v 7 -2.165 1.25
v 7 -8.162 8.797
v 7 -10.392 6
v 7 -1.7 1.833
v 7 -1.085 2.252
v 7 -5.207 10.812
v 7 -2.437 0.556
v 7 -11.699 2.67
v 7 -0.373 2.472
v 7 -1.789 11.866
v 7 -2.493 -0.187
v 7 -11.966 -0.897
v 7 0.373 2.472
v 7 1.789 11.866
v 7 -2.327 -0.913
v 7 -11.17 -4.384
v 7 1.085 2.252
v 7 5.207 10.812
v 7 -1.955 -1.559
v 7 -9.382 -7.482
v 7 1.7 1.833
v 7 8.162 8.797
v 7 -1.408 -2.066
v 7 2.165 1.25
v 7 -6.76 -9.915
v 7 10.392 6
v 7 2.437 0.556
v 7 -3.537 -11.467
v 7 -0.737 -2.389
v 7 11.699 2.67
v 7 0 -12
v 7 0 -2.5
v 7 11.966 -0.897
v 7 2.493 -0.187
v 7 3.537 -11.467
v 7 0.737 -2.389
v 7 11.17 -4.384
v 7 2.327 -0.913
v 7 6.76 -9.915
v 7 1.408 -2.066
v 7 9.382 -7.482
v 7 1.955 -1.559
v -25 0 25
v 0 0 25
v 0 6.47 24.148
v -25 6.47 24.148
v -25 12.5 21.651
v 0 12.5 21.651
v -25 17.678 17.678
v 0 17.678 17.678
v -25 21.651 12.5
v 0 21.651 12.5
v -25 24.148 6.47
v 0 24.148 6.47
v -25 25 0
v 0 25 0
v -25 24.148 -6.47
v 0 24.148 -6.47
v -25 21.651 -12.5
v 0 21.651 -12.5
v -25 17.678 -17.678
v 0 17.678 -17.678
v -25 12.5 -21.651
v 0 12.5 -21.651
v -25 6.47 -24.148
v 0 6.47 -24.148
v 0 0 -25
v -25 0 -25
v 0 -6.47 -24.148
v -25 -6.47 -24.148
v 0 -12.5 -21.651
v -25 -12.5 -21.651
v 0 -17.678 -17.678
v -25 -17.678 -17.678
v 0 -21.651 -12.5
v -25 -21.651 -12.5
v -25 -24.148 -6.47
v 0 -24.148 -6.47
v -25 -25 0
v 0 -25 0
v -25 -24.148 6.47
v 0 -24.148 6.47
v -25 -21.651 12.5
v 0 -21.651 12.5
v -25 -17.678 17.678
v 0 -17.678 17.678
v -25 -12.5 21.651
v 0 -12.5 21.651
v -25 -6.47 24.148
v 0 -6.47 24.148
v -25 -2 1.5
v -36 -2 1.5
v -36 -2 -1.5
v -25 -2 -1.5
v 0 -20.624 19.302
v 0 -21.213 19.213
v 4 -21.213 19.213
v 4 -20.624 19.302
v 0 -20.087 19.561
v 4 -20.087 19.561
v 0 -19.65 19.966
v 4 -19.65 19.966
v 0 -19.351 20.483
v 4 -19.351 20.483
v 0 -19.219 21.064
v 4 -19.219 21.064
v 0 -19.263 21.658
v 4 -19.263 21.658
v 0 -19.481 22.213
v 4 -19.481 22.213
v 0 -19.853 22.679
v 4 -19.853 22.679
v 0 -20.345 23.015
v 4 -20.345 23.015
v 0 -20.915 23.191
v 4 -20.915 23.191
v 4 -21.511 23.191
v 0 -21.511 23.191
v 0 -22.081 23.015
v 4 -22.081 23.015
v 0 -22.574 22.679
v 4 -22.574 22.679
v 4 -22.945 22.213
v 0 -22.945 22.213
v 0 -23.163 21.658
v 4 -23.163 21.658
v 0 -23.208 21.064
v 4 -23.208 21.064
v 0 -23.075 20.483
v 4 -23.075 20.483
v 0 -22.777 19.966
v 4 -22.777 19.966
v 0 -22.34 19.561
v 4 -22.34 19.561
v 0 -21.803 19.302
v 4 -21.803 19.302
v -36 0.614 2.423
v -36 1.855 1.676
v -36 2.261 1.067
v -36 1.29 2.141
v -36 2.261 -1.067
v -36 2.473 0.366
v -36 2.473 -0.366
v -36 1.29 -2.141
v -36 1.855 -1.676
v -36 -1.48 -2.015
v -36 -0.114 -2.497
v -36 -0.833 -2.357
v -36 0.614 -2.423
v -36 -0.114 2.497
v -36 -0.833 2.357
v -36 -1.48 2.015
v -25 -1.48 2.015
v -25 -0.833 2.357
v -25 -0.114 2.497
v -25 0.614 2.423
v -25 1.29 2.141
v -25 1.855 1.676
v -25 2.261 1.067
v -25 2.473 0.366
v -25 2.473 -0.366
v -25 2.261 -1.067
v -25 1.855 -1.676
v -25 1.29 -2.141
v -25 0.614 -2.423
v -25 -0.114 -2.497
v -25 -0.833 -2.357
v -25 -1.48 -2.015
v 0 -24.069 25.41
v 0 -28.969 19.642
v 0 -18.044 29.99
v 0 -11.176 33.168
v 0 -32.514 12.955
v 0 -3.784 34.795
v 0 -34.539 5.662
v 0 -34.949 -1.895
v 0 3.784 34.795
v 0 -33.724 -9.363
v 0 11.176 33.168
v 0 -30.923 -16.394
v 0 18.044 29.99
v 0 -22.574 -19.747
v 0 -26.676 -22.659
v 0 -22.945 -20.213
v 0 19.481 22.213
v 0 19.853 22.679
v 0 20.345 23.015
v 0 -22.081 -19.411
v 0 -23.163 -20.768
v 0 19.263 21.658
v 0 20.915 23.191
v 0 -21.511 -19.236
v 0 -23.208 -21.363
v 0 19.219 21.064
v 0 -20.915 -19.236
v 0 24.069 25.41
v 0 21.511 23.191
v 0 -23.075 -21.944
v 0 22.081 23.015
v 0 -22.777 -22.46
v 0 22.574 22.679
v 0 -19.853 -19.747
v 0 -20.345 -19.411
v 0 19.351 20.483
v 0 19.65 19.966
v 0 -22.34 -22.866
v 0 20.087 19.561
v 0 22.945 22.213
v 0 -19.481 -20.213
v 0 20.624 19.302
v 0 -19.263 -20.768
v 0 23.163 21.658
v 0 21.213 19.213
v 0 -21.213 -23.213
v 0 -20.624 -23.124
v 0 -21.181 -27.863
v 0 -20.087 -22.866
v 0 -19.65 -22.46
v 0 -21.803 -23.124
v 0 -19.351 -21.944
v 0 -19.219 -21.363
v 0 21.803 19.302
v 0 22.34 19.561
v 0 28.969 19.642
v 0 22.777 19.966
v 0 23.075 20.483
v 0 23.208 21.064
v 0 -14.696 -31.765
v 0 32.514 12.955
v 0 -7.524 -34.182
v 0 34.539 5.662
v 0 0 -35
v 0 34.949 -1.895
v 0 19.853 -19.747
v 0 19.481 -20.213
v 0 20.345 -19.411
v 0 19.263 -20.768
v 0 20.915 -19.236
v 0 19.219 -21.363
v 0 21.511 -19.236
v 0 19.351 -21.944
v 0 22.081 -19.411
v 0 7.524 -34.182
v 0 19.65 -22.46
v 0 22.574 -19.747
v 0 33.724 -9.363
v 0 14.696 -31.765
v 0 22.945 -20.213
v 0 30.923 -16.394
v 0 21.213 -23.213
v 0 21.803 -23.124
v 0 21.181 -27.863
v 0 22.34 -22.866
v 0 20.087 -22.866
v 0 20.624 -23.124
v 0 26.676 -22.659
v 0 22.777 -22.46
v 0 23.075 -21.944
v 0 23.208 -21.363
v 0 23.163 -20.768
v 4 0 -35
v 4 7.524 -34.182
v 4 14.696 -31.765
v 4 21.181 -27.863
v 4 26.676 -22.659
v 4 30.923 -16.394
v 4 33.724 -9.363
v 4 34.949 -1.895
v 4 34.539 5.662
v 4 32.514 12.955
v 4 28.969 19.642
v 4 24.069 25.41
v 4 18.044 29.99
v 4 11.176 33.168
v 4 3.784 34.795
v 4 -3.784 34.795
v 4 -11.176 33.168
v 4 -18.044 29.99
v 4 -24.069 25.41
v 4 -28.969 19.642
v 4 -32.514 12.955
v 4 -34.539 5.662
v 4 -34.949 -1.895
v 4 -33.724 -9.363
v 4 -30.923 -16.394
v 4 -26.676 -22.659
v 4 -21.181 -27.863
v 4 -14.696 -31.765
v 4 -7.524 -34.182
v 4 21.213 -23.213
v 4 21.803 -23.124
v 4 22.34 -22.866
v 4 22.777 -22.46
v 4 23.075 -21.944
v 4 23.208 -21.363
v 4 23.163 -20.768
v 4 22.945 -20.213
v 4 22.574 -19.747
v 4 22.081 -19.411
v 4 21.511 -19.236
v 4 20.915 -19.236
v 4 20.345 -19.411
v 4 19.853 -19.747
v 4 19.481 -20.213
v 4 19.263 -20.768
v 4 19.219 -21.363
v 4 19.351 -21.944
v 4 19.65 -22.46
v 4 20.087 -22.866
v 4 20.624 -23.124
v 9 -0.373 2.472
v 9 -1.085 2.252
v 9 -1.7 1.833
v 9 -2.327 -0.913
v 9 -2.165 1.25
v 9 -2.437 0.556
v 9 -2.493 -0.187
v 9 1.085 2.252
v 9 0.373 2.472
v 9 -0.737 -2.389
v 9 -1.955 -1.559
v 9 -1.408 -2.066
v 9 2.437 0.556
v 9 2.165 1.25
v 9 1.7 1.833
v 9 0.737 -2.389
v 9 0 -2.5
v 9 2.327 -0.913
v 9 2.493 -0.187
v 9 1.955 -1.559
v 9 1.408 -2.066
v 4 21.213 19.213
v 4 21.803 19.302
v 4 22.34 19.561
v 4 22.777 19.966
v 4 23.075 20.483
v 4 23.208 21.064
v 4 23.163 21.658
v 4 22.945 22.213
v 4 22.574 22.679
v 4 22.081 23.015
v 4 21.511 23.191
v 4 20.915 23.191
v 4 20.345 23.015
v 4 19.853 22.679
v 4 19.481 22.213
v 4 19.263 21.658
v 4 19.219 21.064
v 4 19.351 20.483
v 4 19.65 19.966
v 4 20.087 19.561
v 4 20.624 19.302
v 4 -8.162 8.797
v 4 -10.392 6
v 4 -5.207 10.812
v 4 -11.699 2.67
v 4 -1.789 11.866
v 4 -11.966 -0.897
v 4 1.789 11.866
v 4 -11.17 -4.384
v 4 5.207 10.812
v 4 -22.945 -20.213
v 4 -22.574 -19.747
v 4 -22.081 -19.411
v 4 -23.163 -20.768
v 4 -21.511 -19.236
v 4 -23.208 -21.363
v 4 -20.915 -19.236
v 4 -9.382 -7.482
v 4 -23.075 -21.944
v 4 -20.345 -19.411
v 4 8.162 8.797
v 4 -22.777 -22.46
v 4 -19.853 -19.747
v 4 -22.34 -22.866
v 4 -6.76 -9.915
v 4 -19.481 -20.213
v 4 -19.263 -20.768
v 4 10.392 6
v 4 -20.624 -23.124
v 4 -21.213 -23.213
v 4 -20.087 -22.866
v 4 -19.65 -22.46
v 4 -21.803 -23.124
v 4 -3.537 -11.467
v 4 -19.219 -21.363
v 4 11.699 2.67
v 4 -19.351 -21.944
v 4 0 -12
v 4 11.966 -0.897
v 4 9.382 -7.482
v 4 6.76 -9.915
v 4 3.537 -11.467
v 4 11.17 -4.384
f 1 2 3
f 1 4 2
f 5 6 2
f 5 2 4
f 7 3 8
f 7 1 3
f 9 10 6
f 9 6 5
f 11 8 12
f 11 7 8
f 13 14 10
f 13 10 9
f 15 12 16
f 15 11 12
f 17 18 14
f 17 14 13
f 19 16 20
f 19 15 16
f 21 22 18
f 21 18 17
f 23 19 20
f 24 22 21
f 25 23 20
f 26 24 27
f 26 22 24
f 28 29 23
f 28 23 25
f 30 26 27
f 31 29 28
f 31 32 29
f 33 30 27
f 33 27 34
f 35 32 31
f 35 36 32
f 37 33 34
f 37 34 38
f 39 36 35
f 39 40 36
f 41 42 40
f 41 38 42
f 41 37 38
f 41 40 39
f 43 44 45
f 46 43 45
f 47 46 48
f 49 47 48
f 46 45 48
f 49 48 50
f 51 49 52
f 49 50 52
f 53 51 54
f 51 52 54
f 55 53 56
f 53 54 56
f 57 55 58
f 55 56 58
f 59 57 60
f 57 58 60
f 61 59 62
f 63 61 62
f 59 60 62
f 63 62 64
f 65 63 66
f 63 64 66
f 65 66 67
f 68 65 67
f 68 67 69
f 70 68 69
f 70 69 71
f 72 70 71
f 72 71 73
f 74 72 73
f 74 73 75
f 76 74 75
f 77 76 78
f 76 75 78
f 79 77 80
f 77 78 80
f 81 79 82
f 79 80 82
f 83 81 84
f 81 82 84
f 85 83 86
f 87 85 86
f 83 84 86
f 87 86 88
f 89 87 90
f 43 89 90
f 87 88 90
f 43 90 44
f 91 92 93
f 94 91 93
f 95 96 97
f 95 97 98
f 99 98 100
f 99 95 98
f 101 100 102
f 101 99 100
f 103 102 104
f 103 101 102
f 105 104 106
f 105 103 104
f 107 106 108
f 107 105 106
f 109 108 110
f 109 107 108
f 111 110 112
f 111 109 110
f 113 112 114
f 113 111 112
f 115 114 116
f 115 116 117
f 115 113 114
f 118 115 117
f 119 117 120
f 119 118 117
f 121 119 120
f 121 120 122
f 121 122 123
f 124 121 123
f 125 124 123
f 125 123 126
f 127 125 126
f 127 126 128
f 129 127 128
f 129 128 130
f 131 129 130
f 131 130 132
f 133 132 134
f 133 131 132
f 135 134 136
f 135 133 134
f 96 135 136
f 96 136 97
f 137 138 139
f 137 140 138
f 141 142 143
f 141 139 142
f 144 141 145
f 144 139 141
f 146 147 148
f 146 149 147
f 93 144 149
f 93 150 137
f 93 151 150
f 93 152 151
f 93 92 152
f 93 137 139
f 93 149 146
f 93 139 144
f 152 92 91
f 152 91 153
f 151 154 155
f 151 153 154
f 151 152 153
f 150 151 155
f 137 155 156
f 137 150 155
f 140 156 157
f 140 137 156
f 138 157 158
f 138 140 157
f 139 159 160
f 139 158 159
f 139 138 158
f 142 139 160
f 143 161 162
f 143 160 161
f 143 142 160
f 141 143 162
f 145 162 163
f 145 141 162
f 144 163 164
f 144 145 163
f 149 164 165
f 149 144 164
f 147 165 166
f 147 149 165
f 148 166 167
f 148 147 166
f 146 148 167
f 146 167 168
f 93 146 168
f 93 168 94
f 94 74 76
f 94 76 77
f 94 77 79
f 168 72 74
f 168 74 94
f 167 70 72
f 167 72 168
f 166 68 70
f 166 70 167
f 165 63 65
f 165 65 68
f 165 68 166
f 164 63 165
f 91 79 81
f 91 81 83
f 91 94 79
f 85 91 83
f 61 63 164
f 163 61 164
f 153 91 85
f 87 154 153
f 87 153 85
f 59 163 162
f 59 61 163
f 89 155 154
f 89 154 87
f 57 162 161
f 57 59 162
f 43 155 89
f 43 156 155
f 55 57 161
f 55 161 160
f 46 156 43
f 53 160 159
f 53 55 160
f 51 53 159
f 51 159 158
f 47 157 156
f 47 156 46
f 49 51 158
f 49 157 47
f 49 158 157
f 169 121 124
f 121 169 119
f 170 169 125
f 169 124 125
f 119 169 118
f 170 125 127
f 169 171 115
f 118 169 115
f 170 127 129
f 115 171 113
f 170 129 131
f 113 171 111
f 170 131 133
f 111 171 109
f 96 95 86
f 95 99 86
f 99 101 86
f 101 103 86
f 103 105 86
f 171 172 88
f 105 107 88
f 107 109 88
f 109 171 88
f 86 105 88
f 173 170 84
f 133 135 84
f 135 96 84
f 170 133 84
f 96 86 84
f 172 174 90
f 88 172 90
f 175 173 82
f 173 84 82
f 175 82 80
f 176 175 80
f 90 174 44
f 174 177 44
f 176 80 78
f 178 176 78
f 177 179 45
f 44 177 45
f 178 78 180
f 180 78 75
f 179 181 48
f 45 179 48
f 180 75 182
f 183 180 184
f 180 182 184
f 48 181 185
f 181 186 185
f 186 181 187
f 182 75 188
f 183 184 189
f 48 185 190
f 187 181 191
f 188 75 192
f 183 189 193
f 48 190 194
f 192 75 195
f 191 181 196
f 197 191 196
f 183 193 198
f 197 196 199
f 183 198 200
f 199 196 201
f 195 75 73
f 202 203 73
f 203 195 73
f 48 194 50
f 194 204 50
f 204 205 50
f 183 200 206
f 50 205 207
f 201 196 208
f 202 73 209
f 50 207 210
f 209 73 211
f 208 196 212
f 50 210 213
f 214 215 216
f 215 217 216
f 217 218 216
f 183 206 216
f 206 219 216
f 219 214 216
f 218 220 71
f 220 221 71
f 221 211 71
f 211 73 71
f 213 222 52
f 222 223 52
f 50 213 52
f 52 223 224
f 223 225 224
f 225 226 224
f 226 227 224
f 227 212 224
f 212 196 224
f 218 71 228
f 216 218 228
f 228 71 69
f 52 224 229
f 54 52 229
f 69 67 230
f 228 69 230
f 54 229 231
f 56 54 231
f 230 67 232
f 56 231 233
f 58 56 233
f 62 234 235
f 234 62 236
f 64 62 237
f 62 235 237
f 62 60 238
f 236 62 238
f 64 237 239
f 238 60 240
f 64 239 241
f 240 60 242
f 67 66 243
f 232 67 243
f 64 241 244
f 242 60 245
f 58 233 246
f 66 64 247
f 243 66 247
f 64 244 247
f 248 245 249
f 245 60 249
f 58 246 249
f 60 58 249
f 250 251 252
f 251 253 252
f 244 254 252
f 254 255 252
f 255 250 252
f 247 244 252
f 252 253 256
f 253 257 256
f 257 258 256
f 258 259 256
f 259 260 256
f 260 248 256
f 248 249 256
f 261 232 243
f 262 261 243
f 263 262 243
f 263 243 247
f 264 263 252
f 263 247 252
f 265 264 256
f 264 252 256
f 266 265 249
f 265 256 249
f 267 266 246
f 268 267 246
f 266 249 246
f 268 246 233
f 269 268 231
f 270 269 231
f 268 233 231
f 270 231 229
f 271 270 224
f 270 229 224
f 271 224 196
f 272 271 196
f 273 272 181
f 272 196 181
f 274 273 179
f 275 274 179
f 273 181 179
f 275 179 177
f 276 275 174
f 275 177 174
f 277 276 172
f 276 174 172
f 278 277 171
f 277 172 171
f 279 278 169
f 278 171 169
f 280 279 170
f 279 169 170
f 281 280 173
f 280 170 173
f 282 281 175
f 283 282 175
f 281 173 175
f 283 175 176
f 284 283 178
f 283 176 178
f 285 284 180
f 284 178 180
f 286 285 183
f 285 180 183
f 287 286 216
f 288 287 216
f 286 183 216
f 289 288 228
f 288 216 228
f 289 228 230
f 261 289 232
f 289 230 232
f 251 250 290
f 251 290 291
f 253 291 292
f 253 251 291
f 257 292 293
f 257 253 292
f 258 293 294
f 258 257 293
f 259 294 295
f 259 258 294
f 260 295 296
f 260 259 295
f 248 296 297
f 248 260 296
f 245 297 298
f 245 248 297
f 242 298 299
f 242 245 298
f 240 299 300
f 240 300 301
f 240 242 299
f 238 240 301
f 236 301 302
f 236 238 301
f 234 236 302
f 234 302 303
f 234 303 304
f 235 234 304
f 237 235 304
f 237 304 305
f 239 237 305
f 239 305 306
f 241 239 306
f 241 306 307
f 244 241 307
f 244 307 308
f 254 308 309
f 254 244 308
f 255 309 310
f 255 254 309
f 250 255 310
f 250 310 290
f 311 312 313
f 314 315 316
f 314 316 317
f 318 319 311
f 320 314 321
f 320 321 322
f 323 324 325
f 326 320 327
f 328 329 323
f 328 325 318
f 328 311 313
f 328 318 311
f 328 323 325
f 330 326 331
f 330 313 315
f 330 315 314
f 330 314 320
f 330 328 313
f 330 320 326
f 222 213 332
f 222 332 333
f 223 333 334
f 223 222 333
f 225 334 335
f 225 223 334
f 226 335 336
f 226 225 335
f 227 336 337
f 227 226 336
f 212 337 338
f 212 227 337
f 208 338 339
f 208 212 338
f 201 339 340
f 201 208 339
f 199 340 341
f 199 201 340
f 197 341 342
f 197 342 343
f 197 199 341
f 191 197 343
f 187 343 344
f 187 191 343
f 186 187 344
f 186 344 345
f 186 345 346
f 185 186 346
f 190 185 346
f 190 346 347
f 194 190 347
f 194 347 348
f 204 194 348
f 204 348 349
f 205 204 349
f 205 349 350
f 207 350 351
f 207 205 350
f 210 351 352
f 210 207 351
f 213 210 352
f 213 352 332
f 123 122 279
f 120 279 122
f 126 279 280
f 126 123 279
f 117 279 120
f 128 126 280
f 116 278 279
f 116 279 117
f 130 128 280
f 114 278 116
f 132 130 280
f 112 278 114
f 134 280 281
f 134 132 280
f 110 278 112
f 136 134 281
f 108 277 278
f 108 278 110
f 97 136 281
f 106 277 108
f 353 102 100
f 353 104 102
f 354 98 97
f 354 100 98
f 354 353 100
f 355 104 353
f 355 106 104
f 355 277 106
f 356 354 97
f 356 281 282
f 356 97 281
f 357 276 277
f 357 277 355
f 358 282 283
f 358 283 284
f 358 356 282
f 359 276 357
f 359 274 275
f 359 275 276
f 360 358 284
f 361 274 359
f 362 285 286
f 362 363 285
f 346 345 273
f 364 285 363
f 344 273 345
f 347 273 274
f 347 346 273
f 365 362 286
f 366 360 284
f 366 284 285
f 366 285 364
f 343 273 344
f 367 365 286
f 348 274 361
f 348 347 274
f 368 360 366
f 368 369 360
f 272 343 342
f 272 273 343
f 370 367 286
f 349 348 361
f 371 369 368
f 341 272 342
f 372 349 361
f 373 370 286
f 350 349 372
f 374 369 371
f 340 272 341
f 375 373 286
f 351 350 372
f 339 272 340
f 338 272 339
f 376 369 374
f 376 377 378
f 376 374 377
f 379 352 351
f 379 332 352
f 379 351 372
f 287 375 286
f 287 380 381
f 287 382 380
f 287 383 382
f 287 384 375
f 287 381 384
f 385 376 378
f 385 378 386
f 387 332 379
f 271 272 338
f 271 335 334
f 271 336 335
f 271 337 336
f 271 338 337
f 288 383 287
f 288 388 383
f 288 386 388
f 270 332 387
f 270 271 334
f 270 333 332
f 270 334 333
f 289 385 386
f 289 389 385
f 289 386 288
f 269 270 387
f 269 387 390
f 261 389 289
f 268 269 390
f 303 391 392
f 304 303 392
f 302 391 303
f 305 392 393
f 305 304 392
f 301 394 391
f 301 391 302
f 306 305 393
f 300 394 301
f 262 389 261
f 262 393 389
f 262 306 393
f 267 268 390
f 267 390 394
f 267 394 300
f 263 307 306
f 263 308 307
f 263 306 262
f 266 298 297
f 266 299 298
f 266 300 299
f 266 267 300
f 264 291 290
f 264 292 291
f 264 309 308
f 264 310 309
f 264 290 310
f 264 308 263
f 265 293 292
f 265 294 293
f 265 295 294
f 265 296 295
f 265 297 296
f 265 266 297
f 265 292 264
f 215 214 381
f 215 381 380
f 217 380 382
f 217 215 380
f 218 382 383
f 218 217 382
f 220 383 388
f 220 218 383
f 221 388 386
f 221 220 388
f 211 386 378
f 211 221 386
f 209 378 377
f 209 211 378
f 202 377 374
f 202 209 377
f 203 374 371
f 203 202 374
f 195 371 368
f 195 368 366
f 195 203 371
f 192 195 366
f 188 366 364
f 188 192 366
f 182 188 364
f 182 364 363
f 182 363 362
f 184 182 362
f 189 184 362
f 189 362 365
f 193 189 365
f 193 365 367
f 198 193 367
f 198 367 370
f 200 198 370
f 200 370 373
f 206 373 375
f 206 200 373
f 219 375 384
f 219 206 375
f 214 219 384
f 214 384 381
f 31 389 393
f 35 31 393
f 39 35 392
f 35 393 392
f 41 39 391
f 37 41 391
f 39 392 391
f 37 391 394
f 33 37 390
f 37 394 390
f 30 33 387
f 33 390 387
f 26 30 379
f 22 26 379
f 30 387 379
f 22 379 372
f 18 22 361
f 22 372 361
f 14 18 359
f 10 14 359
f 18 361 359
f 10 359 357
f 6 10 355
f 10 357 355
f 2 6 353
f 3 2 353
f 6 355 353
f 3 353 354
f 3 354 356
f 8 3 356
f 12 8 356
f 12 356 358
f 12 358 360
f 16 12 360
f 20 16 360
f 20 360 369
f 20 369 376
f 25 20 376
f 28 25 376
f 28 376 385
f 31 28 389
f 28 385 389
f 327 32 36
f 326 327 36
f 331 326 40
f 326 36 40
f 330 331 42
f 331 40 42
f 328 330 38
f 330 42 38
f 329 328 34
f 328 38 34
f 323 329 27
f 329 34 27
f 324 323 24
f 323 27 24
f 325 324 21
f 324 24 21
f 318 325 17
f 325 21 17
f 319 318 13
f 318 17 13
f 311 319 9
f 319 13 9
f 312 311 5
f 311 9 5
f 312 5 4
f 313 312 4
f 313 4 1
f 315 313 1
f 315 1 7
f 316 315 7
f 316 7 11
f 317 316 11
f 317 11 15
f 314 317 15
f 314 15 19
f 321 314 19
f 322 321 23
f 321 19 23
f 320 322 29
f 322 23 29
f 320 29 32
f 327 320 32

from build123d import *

# Parameters (mm, degrees)
SKETCH_1_R          = 35
SKETCH_1_R_2        = 2
EXTRUDE_1_DEPTH     = 4
SKETCH_2_R          = 12
EXTRUDE_2_DEPTH     = 3
SKETCH_3_R          = 2.5
EXTRUDE_3_DEPTH     = 2
SKETCH_4_R          = 25
EXTRUDE_4_DEPTH     = 25
EXTRUDE_START       = 11
SKETCH_5_R          = 2.5
EXTRUDE_5_DEPTH     = 11
CUT_EXTRUDE_1_DEPTH = 11


with BuildPart() as part:
    # 草图1 → 凸台-拉伸1 (new body)
    with BuildSketch(Plane(origin=(0, 0, 0), x_dir=(0, 0, -1), z_dir=(1, 0, 0))):
        Circle(SKETCH_1_R)
        with Locations((21.213203436, 21.213203436)):
            Circle(SKETCH_1_R_2, mode=Mode.SUBTRACT)
        with Locations((-21.213203436, 21.213203436)):
            Circle(SKETCH_1_R_2, mode=Mode.SUBTRACT)
        with Locations((-21.213203436, -21.213203436)):
            Circle(SKETCH_1_R_2, mode=Mode.SUBTRACT)
        with Locations((21.213203436, -21.213203436)):
            Circle(SKETCH_1_R_2, mode=Mode.SUBTRACT)
    extrude(amount=EXTRUDE_1_DEPTH)

    # 草图2 → 凸台-拉伸2 (add)
    with BuildSketch(Plane(origin=(4, 0, 0), x_dir=(0, 0, -1), z_dir=(1, 0, 0))):
        Circle(SKETCH_2_R)
    extrude(amount=EXTRUDE_2_DEPTH)

    # 草图3 → 凸台-拉伸3 (add)
    with BuildSketch(Plane(origin=(7, 0, 0), x_dir=(0, 0, -1), z_dir=(1, 0, 0))):
        Circle(SKETCH_3_R)
    extrude(amount=EXTRUDE_3_DEPTH)

    # 草图4 → 凸台-拉伸4 (add)
    with BuildSketch(Plane.ZY):
        Circle(SKETCH_4_R)
    extrude(amount=EXTRUDE_4_DEPTH)

    # 草图5 → 凸台-拉伸5 (add)
    with BuildSketch(Plane.ZY.offset(25).offset(EXTRUDE_START)):
        with Locations(Location((0, 0, 0), (0, 0, 180))):
            Circle(SKETCH_5_R)
    extrude(amount=-EXTRUDE_5_DEPTH)

    # 草图6 → 切除-拉伸1 (cut)
    with BuildSketch(Plane.ZY.offset(36)):
        Polygon((1.5, -2), (-1.5, -2), (-1.5, -3.83926129), (2.04191787, -3.83926129), align=None)
    extrude(amount=-CUT_EXTRUDE_1_DEPTH, mode=Mode.SUBTRACT)


solid = part.part
